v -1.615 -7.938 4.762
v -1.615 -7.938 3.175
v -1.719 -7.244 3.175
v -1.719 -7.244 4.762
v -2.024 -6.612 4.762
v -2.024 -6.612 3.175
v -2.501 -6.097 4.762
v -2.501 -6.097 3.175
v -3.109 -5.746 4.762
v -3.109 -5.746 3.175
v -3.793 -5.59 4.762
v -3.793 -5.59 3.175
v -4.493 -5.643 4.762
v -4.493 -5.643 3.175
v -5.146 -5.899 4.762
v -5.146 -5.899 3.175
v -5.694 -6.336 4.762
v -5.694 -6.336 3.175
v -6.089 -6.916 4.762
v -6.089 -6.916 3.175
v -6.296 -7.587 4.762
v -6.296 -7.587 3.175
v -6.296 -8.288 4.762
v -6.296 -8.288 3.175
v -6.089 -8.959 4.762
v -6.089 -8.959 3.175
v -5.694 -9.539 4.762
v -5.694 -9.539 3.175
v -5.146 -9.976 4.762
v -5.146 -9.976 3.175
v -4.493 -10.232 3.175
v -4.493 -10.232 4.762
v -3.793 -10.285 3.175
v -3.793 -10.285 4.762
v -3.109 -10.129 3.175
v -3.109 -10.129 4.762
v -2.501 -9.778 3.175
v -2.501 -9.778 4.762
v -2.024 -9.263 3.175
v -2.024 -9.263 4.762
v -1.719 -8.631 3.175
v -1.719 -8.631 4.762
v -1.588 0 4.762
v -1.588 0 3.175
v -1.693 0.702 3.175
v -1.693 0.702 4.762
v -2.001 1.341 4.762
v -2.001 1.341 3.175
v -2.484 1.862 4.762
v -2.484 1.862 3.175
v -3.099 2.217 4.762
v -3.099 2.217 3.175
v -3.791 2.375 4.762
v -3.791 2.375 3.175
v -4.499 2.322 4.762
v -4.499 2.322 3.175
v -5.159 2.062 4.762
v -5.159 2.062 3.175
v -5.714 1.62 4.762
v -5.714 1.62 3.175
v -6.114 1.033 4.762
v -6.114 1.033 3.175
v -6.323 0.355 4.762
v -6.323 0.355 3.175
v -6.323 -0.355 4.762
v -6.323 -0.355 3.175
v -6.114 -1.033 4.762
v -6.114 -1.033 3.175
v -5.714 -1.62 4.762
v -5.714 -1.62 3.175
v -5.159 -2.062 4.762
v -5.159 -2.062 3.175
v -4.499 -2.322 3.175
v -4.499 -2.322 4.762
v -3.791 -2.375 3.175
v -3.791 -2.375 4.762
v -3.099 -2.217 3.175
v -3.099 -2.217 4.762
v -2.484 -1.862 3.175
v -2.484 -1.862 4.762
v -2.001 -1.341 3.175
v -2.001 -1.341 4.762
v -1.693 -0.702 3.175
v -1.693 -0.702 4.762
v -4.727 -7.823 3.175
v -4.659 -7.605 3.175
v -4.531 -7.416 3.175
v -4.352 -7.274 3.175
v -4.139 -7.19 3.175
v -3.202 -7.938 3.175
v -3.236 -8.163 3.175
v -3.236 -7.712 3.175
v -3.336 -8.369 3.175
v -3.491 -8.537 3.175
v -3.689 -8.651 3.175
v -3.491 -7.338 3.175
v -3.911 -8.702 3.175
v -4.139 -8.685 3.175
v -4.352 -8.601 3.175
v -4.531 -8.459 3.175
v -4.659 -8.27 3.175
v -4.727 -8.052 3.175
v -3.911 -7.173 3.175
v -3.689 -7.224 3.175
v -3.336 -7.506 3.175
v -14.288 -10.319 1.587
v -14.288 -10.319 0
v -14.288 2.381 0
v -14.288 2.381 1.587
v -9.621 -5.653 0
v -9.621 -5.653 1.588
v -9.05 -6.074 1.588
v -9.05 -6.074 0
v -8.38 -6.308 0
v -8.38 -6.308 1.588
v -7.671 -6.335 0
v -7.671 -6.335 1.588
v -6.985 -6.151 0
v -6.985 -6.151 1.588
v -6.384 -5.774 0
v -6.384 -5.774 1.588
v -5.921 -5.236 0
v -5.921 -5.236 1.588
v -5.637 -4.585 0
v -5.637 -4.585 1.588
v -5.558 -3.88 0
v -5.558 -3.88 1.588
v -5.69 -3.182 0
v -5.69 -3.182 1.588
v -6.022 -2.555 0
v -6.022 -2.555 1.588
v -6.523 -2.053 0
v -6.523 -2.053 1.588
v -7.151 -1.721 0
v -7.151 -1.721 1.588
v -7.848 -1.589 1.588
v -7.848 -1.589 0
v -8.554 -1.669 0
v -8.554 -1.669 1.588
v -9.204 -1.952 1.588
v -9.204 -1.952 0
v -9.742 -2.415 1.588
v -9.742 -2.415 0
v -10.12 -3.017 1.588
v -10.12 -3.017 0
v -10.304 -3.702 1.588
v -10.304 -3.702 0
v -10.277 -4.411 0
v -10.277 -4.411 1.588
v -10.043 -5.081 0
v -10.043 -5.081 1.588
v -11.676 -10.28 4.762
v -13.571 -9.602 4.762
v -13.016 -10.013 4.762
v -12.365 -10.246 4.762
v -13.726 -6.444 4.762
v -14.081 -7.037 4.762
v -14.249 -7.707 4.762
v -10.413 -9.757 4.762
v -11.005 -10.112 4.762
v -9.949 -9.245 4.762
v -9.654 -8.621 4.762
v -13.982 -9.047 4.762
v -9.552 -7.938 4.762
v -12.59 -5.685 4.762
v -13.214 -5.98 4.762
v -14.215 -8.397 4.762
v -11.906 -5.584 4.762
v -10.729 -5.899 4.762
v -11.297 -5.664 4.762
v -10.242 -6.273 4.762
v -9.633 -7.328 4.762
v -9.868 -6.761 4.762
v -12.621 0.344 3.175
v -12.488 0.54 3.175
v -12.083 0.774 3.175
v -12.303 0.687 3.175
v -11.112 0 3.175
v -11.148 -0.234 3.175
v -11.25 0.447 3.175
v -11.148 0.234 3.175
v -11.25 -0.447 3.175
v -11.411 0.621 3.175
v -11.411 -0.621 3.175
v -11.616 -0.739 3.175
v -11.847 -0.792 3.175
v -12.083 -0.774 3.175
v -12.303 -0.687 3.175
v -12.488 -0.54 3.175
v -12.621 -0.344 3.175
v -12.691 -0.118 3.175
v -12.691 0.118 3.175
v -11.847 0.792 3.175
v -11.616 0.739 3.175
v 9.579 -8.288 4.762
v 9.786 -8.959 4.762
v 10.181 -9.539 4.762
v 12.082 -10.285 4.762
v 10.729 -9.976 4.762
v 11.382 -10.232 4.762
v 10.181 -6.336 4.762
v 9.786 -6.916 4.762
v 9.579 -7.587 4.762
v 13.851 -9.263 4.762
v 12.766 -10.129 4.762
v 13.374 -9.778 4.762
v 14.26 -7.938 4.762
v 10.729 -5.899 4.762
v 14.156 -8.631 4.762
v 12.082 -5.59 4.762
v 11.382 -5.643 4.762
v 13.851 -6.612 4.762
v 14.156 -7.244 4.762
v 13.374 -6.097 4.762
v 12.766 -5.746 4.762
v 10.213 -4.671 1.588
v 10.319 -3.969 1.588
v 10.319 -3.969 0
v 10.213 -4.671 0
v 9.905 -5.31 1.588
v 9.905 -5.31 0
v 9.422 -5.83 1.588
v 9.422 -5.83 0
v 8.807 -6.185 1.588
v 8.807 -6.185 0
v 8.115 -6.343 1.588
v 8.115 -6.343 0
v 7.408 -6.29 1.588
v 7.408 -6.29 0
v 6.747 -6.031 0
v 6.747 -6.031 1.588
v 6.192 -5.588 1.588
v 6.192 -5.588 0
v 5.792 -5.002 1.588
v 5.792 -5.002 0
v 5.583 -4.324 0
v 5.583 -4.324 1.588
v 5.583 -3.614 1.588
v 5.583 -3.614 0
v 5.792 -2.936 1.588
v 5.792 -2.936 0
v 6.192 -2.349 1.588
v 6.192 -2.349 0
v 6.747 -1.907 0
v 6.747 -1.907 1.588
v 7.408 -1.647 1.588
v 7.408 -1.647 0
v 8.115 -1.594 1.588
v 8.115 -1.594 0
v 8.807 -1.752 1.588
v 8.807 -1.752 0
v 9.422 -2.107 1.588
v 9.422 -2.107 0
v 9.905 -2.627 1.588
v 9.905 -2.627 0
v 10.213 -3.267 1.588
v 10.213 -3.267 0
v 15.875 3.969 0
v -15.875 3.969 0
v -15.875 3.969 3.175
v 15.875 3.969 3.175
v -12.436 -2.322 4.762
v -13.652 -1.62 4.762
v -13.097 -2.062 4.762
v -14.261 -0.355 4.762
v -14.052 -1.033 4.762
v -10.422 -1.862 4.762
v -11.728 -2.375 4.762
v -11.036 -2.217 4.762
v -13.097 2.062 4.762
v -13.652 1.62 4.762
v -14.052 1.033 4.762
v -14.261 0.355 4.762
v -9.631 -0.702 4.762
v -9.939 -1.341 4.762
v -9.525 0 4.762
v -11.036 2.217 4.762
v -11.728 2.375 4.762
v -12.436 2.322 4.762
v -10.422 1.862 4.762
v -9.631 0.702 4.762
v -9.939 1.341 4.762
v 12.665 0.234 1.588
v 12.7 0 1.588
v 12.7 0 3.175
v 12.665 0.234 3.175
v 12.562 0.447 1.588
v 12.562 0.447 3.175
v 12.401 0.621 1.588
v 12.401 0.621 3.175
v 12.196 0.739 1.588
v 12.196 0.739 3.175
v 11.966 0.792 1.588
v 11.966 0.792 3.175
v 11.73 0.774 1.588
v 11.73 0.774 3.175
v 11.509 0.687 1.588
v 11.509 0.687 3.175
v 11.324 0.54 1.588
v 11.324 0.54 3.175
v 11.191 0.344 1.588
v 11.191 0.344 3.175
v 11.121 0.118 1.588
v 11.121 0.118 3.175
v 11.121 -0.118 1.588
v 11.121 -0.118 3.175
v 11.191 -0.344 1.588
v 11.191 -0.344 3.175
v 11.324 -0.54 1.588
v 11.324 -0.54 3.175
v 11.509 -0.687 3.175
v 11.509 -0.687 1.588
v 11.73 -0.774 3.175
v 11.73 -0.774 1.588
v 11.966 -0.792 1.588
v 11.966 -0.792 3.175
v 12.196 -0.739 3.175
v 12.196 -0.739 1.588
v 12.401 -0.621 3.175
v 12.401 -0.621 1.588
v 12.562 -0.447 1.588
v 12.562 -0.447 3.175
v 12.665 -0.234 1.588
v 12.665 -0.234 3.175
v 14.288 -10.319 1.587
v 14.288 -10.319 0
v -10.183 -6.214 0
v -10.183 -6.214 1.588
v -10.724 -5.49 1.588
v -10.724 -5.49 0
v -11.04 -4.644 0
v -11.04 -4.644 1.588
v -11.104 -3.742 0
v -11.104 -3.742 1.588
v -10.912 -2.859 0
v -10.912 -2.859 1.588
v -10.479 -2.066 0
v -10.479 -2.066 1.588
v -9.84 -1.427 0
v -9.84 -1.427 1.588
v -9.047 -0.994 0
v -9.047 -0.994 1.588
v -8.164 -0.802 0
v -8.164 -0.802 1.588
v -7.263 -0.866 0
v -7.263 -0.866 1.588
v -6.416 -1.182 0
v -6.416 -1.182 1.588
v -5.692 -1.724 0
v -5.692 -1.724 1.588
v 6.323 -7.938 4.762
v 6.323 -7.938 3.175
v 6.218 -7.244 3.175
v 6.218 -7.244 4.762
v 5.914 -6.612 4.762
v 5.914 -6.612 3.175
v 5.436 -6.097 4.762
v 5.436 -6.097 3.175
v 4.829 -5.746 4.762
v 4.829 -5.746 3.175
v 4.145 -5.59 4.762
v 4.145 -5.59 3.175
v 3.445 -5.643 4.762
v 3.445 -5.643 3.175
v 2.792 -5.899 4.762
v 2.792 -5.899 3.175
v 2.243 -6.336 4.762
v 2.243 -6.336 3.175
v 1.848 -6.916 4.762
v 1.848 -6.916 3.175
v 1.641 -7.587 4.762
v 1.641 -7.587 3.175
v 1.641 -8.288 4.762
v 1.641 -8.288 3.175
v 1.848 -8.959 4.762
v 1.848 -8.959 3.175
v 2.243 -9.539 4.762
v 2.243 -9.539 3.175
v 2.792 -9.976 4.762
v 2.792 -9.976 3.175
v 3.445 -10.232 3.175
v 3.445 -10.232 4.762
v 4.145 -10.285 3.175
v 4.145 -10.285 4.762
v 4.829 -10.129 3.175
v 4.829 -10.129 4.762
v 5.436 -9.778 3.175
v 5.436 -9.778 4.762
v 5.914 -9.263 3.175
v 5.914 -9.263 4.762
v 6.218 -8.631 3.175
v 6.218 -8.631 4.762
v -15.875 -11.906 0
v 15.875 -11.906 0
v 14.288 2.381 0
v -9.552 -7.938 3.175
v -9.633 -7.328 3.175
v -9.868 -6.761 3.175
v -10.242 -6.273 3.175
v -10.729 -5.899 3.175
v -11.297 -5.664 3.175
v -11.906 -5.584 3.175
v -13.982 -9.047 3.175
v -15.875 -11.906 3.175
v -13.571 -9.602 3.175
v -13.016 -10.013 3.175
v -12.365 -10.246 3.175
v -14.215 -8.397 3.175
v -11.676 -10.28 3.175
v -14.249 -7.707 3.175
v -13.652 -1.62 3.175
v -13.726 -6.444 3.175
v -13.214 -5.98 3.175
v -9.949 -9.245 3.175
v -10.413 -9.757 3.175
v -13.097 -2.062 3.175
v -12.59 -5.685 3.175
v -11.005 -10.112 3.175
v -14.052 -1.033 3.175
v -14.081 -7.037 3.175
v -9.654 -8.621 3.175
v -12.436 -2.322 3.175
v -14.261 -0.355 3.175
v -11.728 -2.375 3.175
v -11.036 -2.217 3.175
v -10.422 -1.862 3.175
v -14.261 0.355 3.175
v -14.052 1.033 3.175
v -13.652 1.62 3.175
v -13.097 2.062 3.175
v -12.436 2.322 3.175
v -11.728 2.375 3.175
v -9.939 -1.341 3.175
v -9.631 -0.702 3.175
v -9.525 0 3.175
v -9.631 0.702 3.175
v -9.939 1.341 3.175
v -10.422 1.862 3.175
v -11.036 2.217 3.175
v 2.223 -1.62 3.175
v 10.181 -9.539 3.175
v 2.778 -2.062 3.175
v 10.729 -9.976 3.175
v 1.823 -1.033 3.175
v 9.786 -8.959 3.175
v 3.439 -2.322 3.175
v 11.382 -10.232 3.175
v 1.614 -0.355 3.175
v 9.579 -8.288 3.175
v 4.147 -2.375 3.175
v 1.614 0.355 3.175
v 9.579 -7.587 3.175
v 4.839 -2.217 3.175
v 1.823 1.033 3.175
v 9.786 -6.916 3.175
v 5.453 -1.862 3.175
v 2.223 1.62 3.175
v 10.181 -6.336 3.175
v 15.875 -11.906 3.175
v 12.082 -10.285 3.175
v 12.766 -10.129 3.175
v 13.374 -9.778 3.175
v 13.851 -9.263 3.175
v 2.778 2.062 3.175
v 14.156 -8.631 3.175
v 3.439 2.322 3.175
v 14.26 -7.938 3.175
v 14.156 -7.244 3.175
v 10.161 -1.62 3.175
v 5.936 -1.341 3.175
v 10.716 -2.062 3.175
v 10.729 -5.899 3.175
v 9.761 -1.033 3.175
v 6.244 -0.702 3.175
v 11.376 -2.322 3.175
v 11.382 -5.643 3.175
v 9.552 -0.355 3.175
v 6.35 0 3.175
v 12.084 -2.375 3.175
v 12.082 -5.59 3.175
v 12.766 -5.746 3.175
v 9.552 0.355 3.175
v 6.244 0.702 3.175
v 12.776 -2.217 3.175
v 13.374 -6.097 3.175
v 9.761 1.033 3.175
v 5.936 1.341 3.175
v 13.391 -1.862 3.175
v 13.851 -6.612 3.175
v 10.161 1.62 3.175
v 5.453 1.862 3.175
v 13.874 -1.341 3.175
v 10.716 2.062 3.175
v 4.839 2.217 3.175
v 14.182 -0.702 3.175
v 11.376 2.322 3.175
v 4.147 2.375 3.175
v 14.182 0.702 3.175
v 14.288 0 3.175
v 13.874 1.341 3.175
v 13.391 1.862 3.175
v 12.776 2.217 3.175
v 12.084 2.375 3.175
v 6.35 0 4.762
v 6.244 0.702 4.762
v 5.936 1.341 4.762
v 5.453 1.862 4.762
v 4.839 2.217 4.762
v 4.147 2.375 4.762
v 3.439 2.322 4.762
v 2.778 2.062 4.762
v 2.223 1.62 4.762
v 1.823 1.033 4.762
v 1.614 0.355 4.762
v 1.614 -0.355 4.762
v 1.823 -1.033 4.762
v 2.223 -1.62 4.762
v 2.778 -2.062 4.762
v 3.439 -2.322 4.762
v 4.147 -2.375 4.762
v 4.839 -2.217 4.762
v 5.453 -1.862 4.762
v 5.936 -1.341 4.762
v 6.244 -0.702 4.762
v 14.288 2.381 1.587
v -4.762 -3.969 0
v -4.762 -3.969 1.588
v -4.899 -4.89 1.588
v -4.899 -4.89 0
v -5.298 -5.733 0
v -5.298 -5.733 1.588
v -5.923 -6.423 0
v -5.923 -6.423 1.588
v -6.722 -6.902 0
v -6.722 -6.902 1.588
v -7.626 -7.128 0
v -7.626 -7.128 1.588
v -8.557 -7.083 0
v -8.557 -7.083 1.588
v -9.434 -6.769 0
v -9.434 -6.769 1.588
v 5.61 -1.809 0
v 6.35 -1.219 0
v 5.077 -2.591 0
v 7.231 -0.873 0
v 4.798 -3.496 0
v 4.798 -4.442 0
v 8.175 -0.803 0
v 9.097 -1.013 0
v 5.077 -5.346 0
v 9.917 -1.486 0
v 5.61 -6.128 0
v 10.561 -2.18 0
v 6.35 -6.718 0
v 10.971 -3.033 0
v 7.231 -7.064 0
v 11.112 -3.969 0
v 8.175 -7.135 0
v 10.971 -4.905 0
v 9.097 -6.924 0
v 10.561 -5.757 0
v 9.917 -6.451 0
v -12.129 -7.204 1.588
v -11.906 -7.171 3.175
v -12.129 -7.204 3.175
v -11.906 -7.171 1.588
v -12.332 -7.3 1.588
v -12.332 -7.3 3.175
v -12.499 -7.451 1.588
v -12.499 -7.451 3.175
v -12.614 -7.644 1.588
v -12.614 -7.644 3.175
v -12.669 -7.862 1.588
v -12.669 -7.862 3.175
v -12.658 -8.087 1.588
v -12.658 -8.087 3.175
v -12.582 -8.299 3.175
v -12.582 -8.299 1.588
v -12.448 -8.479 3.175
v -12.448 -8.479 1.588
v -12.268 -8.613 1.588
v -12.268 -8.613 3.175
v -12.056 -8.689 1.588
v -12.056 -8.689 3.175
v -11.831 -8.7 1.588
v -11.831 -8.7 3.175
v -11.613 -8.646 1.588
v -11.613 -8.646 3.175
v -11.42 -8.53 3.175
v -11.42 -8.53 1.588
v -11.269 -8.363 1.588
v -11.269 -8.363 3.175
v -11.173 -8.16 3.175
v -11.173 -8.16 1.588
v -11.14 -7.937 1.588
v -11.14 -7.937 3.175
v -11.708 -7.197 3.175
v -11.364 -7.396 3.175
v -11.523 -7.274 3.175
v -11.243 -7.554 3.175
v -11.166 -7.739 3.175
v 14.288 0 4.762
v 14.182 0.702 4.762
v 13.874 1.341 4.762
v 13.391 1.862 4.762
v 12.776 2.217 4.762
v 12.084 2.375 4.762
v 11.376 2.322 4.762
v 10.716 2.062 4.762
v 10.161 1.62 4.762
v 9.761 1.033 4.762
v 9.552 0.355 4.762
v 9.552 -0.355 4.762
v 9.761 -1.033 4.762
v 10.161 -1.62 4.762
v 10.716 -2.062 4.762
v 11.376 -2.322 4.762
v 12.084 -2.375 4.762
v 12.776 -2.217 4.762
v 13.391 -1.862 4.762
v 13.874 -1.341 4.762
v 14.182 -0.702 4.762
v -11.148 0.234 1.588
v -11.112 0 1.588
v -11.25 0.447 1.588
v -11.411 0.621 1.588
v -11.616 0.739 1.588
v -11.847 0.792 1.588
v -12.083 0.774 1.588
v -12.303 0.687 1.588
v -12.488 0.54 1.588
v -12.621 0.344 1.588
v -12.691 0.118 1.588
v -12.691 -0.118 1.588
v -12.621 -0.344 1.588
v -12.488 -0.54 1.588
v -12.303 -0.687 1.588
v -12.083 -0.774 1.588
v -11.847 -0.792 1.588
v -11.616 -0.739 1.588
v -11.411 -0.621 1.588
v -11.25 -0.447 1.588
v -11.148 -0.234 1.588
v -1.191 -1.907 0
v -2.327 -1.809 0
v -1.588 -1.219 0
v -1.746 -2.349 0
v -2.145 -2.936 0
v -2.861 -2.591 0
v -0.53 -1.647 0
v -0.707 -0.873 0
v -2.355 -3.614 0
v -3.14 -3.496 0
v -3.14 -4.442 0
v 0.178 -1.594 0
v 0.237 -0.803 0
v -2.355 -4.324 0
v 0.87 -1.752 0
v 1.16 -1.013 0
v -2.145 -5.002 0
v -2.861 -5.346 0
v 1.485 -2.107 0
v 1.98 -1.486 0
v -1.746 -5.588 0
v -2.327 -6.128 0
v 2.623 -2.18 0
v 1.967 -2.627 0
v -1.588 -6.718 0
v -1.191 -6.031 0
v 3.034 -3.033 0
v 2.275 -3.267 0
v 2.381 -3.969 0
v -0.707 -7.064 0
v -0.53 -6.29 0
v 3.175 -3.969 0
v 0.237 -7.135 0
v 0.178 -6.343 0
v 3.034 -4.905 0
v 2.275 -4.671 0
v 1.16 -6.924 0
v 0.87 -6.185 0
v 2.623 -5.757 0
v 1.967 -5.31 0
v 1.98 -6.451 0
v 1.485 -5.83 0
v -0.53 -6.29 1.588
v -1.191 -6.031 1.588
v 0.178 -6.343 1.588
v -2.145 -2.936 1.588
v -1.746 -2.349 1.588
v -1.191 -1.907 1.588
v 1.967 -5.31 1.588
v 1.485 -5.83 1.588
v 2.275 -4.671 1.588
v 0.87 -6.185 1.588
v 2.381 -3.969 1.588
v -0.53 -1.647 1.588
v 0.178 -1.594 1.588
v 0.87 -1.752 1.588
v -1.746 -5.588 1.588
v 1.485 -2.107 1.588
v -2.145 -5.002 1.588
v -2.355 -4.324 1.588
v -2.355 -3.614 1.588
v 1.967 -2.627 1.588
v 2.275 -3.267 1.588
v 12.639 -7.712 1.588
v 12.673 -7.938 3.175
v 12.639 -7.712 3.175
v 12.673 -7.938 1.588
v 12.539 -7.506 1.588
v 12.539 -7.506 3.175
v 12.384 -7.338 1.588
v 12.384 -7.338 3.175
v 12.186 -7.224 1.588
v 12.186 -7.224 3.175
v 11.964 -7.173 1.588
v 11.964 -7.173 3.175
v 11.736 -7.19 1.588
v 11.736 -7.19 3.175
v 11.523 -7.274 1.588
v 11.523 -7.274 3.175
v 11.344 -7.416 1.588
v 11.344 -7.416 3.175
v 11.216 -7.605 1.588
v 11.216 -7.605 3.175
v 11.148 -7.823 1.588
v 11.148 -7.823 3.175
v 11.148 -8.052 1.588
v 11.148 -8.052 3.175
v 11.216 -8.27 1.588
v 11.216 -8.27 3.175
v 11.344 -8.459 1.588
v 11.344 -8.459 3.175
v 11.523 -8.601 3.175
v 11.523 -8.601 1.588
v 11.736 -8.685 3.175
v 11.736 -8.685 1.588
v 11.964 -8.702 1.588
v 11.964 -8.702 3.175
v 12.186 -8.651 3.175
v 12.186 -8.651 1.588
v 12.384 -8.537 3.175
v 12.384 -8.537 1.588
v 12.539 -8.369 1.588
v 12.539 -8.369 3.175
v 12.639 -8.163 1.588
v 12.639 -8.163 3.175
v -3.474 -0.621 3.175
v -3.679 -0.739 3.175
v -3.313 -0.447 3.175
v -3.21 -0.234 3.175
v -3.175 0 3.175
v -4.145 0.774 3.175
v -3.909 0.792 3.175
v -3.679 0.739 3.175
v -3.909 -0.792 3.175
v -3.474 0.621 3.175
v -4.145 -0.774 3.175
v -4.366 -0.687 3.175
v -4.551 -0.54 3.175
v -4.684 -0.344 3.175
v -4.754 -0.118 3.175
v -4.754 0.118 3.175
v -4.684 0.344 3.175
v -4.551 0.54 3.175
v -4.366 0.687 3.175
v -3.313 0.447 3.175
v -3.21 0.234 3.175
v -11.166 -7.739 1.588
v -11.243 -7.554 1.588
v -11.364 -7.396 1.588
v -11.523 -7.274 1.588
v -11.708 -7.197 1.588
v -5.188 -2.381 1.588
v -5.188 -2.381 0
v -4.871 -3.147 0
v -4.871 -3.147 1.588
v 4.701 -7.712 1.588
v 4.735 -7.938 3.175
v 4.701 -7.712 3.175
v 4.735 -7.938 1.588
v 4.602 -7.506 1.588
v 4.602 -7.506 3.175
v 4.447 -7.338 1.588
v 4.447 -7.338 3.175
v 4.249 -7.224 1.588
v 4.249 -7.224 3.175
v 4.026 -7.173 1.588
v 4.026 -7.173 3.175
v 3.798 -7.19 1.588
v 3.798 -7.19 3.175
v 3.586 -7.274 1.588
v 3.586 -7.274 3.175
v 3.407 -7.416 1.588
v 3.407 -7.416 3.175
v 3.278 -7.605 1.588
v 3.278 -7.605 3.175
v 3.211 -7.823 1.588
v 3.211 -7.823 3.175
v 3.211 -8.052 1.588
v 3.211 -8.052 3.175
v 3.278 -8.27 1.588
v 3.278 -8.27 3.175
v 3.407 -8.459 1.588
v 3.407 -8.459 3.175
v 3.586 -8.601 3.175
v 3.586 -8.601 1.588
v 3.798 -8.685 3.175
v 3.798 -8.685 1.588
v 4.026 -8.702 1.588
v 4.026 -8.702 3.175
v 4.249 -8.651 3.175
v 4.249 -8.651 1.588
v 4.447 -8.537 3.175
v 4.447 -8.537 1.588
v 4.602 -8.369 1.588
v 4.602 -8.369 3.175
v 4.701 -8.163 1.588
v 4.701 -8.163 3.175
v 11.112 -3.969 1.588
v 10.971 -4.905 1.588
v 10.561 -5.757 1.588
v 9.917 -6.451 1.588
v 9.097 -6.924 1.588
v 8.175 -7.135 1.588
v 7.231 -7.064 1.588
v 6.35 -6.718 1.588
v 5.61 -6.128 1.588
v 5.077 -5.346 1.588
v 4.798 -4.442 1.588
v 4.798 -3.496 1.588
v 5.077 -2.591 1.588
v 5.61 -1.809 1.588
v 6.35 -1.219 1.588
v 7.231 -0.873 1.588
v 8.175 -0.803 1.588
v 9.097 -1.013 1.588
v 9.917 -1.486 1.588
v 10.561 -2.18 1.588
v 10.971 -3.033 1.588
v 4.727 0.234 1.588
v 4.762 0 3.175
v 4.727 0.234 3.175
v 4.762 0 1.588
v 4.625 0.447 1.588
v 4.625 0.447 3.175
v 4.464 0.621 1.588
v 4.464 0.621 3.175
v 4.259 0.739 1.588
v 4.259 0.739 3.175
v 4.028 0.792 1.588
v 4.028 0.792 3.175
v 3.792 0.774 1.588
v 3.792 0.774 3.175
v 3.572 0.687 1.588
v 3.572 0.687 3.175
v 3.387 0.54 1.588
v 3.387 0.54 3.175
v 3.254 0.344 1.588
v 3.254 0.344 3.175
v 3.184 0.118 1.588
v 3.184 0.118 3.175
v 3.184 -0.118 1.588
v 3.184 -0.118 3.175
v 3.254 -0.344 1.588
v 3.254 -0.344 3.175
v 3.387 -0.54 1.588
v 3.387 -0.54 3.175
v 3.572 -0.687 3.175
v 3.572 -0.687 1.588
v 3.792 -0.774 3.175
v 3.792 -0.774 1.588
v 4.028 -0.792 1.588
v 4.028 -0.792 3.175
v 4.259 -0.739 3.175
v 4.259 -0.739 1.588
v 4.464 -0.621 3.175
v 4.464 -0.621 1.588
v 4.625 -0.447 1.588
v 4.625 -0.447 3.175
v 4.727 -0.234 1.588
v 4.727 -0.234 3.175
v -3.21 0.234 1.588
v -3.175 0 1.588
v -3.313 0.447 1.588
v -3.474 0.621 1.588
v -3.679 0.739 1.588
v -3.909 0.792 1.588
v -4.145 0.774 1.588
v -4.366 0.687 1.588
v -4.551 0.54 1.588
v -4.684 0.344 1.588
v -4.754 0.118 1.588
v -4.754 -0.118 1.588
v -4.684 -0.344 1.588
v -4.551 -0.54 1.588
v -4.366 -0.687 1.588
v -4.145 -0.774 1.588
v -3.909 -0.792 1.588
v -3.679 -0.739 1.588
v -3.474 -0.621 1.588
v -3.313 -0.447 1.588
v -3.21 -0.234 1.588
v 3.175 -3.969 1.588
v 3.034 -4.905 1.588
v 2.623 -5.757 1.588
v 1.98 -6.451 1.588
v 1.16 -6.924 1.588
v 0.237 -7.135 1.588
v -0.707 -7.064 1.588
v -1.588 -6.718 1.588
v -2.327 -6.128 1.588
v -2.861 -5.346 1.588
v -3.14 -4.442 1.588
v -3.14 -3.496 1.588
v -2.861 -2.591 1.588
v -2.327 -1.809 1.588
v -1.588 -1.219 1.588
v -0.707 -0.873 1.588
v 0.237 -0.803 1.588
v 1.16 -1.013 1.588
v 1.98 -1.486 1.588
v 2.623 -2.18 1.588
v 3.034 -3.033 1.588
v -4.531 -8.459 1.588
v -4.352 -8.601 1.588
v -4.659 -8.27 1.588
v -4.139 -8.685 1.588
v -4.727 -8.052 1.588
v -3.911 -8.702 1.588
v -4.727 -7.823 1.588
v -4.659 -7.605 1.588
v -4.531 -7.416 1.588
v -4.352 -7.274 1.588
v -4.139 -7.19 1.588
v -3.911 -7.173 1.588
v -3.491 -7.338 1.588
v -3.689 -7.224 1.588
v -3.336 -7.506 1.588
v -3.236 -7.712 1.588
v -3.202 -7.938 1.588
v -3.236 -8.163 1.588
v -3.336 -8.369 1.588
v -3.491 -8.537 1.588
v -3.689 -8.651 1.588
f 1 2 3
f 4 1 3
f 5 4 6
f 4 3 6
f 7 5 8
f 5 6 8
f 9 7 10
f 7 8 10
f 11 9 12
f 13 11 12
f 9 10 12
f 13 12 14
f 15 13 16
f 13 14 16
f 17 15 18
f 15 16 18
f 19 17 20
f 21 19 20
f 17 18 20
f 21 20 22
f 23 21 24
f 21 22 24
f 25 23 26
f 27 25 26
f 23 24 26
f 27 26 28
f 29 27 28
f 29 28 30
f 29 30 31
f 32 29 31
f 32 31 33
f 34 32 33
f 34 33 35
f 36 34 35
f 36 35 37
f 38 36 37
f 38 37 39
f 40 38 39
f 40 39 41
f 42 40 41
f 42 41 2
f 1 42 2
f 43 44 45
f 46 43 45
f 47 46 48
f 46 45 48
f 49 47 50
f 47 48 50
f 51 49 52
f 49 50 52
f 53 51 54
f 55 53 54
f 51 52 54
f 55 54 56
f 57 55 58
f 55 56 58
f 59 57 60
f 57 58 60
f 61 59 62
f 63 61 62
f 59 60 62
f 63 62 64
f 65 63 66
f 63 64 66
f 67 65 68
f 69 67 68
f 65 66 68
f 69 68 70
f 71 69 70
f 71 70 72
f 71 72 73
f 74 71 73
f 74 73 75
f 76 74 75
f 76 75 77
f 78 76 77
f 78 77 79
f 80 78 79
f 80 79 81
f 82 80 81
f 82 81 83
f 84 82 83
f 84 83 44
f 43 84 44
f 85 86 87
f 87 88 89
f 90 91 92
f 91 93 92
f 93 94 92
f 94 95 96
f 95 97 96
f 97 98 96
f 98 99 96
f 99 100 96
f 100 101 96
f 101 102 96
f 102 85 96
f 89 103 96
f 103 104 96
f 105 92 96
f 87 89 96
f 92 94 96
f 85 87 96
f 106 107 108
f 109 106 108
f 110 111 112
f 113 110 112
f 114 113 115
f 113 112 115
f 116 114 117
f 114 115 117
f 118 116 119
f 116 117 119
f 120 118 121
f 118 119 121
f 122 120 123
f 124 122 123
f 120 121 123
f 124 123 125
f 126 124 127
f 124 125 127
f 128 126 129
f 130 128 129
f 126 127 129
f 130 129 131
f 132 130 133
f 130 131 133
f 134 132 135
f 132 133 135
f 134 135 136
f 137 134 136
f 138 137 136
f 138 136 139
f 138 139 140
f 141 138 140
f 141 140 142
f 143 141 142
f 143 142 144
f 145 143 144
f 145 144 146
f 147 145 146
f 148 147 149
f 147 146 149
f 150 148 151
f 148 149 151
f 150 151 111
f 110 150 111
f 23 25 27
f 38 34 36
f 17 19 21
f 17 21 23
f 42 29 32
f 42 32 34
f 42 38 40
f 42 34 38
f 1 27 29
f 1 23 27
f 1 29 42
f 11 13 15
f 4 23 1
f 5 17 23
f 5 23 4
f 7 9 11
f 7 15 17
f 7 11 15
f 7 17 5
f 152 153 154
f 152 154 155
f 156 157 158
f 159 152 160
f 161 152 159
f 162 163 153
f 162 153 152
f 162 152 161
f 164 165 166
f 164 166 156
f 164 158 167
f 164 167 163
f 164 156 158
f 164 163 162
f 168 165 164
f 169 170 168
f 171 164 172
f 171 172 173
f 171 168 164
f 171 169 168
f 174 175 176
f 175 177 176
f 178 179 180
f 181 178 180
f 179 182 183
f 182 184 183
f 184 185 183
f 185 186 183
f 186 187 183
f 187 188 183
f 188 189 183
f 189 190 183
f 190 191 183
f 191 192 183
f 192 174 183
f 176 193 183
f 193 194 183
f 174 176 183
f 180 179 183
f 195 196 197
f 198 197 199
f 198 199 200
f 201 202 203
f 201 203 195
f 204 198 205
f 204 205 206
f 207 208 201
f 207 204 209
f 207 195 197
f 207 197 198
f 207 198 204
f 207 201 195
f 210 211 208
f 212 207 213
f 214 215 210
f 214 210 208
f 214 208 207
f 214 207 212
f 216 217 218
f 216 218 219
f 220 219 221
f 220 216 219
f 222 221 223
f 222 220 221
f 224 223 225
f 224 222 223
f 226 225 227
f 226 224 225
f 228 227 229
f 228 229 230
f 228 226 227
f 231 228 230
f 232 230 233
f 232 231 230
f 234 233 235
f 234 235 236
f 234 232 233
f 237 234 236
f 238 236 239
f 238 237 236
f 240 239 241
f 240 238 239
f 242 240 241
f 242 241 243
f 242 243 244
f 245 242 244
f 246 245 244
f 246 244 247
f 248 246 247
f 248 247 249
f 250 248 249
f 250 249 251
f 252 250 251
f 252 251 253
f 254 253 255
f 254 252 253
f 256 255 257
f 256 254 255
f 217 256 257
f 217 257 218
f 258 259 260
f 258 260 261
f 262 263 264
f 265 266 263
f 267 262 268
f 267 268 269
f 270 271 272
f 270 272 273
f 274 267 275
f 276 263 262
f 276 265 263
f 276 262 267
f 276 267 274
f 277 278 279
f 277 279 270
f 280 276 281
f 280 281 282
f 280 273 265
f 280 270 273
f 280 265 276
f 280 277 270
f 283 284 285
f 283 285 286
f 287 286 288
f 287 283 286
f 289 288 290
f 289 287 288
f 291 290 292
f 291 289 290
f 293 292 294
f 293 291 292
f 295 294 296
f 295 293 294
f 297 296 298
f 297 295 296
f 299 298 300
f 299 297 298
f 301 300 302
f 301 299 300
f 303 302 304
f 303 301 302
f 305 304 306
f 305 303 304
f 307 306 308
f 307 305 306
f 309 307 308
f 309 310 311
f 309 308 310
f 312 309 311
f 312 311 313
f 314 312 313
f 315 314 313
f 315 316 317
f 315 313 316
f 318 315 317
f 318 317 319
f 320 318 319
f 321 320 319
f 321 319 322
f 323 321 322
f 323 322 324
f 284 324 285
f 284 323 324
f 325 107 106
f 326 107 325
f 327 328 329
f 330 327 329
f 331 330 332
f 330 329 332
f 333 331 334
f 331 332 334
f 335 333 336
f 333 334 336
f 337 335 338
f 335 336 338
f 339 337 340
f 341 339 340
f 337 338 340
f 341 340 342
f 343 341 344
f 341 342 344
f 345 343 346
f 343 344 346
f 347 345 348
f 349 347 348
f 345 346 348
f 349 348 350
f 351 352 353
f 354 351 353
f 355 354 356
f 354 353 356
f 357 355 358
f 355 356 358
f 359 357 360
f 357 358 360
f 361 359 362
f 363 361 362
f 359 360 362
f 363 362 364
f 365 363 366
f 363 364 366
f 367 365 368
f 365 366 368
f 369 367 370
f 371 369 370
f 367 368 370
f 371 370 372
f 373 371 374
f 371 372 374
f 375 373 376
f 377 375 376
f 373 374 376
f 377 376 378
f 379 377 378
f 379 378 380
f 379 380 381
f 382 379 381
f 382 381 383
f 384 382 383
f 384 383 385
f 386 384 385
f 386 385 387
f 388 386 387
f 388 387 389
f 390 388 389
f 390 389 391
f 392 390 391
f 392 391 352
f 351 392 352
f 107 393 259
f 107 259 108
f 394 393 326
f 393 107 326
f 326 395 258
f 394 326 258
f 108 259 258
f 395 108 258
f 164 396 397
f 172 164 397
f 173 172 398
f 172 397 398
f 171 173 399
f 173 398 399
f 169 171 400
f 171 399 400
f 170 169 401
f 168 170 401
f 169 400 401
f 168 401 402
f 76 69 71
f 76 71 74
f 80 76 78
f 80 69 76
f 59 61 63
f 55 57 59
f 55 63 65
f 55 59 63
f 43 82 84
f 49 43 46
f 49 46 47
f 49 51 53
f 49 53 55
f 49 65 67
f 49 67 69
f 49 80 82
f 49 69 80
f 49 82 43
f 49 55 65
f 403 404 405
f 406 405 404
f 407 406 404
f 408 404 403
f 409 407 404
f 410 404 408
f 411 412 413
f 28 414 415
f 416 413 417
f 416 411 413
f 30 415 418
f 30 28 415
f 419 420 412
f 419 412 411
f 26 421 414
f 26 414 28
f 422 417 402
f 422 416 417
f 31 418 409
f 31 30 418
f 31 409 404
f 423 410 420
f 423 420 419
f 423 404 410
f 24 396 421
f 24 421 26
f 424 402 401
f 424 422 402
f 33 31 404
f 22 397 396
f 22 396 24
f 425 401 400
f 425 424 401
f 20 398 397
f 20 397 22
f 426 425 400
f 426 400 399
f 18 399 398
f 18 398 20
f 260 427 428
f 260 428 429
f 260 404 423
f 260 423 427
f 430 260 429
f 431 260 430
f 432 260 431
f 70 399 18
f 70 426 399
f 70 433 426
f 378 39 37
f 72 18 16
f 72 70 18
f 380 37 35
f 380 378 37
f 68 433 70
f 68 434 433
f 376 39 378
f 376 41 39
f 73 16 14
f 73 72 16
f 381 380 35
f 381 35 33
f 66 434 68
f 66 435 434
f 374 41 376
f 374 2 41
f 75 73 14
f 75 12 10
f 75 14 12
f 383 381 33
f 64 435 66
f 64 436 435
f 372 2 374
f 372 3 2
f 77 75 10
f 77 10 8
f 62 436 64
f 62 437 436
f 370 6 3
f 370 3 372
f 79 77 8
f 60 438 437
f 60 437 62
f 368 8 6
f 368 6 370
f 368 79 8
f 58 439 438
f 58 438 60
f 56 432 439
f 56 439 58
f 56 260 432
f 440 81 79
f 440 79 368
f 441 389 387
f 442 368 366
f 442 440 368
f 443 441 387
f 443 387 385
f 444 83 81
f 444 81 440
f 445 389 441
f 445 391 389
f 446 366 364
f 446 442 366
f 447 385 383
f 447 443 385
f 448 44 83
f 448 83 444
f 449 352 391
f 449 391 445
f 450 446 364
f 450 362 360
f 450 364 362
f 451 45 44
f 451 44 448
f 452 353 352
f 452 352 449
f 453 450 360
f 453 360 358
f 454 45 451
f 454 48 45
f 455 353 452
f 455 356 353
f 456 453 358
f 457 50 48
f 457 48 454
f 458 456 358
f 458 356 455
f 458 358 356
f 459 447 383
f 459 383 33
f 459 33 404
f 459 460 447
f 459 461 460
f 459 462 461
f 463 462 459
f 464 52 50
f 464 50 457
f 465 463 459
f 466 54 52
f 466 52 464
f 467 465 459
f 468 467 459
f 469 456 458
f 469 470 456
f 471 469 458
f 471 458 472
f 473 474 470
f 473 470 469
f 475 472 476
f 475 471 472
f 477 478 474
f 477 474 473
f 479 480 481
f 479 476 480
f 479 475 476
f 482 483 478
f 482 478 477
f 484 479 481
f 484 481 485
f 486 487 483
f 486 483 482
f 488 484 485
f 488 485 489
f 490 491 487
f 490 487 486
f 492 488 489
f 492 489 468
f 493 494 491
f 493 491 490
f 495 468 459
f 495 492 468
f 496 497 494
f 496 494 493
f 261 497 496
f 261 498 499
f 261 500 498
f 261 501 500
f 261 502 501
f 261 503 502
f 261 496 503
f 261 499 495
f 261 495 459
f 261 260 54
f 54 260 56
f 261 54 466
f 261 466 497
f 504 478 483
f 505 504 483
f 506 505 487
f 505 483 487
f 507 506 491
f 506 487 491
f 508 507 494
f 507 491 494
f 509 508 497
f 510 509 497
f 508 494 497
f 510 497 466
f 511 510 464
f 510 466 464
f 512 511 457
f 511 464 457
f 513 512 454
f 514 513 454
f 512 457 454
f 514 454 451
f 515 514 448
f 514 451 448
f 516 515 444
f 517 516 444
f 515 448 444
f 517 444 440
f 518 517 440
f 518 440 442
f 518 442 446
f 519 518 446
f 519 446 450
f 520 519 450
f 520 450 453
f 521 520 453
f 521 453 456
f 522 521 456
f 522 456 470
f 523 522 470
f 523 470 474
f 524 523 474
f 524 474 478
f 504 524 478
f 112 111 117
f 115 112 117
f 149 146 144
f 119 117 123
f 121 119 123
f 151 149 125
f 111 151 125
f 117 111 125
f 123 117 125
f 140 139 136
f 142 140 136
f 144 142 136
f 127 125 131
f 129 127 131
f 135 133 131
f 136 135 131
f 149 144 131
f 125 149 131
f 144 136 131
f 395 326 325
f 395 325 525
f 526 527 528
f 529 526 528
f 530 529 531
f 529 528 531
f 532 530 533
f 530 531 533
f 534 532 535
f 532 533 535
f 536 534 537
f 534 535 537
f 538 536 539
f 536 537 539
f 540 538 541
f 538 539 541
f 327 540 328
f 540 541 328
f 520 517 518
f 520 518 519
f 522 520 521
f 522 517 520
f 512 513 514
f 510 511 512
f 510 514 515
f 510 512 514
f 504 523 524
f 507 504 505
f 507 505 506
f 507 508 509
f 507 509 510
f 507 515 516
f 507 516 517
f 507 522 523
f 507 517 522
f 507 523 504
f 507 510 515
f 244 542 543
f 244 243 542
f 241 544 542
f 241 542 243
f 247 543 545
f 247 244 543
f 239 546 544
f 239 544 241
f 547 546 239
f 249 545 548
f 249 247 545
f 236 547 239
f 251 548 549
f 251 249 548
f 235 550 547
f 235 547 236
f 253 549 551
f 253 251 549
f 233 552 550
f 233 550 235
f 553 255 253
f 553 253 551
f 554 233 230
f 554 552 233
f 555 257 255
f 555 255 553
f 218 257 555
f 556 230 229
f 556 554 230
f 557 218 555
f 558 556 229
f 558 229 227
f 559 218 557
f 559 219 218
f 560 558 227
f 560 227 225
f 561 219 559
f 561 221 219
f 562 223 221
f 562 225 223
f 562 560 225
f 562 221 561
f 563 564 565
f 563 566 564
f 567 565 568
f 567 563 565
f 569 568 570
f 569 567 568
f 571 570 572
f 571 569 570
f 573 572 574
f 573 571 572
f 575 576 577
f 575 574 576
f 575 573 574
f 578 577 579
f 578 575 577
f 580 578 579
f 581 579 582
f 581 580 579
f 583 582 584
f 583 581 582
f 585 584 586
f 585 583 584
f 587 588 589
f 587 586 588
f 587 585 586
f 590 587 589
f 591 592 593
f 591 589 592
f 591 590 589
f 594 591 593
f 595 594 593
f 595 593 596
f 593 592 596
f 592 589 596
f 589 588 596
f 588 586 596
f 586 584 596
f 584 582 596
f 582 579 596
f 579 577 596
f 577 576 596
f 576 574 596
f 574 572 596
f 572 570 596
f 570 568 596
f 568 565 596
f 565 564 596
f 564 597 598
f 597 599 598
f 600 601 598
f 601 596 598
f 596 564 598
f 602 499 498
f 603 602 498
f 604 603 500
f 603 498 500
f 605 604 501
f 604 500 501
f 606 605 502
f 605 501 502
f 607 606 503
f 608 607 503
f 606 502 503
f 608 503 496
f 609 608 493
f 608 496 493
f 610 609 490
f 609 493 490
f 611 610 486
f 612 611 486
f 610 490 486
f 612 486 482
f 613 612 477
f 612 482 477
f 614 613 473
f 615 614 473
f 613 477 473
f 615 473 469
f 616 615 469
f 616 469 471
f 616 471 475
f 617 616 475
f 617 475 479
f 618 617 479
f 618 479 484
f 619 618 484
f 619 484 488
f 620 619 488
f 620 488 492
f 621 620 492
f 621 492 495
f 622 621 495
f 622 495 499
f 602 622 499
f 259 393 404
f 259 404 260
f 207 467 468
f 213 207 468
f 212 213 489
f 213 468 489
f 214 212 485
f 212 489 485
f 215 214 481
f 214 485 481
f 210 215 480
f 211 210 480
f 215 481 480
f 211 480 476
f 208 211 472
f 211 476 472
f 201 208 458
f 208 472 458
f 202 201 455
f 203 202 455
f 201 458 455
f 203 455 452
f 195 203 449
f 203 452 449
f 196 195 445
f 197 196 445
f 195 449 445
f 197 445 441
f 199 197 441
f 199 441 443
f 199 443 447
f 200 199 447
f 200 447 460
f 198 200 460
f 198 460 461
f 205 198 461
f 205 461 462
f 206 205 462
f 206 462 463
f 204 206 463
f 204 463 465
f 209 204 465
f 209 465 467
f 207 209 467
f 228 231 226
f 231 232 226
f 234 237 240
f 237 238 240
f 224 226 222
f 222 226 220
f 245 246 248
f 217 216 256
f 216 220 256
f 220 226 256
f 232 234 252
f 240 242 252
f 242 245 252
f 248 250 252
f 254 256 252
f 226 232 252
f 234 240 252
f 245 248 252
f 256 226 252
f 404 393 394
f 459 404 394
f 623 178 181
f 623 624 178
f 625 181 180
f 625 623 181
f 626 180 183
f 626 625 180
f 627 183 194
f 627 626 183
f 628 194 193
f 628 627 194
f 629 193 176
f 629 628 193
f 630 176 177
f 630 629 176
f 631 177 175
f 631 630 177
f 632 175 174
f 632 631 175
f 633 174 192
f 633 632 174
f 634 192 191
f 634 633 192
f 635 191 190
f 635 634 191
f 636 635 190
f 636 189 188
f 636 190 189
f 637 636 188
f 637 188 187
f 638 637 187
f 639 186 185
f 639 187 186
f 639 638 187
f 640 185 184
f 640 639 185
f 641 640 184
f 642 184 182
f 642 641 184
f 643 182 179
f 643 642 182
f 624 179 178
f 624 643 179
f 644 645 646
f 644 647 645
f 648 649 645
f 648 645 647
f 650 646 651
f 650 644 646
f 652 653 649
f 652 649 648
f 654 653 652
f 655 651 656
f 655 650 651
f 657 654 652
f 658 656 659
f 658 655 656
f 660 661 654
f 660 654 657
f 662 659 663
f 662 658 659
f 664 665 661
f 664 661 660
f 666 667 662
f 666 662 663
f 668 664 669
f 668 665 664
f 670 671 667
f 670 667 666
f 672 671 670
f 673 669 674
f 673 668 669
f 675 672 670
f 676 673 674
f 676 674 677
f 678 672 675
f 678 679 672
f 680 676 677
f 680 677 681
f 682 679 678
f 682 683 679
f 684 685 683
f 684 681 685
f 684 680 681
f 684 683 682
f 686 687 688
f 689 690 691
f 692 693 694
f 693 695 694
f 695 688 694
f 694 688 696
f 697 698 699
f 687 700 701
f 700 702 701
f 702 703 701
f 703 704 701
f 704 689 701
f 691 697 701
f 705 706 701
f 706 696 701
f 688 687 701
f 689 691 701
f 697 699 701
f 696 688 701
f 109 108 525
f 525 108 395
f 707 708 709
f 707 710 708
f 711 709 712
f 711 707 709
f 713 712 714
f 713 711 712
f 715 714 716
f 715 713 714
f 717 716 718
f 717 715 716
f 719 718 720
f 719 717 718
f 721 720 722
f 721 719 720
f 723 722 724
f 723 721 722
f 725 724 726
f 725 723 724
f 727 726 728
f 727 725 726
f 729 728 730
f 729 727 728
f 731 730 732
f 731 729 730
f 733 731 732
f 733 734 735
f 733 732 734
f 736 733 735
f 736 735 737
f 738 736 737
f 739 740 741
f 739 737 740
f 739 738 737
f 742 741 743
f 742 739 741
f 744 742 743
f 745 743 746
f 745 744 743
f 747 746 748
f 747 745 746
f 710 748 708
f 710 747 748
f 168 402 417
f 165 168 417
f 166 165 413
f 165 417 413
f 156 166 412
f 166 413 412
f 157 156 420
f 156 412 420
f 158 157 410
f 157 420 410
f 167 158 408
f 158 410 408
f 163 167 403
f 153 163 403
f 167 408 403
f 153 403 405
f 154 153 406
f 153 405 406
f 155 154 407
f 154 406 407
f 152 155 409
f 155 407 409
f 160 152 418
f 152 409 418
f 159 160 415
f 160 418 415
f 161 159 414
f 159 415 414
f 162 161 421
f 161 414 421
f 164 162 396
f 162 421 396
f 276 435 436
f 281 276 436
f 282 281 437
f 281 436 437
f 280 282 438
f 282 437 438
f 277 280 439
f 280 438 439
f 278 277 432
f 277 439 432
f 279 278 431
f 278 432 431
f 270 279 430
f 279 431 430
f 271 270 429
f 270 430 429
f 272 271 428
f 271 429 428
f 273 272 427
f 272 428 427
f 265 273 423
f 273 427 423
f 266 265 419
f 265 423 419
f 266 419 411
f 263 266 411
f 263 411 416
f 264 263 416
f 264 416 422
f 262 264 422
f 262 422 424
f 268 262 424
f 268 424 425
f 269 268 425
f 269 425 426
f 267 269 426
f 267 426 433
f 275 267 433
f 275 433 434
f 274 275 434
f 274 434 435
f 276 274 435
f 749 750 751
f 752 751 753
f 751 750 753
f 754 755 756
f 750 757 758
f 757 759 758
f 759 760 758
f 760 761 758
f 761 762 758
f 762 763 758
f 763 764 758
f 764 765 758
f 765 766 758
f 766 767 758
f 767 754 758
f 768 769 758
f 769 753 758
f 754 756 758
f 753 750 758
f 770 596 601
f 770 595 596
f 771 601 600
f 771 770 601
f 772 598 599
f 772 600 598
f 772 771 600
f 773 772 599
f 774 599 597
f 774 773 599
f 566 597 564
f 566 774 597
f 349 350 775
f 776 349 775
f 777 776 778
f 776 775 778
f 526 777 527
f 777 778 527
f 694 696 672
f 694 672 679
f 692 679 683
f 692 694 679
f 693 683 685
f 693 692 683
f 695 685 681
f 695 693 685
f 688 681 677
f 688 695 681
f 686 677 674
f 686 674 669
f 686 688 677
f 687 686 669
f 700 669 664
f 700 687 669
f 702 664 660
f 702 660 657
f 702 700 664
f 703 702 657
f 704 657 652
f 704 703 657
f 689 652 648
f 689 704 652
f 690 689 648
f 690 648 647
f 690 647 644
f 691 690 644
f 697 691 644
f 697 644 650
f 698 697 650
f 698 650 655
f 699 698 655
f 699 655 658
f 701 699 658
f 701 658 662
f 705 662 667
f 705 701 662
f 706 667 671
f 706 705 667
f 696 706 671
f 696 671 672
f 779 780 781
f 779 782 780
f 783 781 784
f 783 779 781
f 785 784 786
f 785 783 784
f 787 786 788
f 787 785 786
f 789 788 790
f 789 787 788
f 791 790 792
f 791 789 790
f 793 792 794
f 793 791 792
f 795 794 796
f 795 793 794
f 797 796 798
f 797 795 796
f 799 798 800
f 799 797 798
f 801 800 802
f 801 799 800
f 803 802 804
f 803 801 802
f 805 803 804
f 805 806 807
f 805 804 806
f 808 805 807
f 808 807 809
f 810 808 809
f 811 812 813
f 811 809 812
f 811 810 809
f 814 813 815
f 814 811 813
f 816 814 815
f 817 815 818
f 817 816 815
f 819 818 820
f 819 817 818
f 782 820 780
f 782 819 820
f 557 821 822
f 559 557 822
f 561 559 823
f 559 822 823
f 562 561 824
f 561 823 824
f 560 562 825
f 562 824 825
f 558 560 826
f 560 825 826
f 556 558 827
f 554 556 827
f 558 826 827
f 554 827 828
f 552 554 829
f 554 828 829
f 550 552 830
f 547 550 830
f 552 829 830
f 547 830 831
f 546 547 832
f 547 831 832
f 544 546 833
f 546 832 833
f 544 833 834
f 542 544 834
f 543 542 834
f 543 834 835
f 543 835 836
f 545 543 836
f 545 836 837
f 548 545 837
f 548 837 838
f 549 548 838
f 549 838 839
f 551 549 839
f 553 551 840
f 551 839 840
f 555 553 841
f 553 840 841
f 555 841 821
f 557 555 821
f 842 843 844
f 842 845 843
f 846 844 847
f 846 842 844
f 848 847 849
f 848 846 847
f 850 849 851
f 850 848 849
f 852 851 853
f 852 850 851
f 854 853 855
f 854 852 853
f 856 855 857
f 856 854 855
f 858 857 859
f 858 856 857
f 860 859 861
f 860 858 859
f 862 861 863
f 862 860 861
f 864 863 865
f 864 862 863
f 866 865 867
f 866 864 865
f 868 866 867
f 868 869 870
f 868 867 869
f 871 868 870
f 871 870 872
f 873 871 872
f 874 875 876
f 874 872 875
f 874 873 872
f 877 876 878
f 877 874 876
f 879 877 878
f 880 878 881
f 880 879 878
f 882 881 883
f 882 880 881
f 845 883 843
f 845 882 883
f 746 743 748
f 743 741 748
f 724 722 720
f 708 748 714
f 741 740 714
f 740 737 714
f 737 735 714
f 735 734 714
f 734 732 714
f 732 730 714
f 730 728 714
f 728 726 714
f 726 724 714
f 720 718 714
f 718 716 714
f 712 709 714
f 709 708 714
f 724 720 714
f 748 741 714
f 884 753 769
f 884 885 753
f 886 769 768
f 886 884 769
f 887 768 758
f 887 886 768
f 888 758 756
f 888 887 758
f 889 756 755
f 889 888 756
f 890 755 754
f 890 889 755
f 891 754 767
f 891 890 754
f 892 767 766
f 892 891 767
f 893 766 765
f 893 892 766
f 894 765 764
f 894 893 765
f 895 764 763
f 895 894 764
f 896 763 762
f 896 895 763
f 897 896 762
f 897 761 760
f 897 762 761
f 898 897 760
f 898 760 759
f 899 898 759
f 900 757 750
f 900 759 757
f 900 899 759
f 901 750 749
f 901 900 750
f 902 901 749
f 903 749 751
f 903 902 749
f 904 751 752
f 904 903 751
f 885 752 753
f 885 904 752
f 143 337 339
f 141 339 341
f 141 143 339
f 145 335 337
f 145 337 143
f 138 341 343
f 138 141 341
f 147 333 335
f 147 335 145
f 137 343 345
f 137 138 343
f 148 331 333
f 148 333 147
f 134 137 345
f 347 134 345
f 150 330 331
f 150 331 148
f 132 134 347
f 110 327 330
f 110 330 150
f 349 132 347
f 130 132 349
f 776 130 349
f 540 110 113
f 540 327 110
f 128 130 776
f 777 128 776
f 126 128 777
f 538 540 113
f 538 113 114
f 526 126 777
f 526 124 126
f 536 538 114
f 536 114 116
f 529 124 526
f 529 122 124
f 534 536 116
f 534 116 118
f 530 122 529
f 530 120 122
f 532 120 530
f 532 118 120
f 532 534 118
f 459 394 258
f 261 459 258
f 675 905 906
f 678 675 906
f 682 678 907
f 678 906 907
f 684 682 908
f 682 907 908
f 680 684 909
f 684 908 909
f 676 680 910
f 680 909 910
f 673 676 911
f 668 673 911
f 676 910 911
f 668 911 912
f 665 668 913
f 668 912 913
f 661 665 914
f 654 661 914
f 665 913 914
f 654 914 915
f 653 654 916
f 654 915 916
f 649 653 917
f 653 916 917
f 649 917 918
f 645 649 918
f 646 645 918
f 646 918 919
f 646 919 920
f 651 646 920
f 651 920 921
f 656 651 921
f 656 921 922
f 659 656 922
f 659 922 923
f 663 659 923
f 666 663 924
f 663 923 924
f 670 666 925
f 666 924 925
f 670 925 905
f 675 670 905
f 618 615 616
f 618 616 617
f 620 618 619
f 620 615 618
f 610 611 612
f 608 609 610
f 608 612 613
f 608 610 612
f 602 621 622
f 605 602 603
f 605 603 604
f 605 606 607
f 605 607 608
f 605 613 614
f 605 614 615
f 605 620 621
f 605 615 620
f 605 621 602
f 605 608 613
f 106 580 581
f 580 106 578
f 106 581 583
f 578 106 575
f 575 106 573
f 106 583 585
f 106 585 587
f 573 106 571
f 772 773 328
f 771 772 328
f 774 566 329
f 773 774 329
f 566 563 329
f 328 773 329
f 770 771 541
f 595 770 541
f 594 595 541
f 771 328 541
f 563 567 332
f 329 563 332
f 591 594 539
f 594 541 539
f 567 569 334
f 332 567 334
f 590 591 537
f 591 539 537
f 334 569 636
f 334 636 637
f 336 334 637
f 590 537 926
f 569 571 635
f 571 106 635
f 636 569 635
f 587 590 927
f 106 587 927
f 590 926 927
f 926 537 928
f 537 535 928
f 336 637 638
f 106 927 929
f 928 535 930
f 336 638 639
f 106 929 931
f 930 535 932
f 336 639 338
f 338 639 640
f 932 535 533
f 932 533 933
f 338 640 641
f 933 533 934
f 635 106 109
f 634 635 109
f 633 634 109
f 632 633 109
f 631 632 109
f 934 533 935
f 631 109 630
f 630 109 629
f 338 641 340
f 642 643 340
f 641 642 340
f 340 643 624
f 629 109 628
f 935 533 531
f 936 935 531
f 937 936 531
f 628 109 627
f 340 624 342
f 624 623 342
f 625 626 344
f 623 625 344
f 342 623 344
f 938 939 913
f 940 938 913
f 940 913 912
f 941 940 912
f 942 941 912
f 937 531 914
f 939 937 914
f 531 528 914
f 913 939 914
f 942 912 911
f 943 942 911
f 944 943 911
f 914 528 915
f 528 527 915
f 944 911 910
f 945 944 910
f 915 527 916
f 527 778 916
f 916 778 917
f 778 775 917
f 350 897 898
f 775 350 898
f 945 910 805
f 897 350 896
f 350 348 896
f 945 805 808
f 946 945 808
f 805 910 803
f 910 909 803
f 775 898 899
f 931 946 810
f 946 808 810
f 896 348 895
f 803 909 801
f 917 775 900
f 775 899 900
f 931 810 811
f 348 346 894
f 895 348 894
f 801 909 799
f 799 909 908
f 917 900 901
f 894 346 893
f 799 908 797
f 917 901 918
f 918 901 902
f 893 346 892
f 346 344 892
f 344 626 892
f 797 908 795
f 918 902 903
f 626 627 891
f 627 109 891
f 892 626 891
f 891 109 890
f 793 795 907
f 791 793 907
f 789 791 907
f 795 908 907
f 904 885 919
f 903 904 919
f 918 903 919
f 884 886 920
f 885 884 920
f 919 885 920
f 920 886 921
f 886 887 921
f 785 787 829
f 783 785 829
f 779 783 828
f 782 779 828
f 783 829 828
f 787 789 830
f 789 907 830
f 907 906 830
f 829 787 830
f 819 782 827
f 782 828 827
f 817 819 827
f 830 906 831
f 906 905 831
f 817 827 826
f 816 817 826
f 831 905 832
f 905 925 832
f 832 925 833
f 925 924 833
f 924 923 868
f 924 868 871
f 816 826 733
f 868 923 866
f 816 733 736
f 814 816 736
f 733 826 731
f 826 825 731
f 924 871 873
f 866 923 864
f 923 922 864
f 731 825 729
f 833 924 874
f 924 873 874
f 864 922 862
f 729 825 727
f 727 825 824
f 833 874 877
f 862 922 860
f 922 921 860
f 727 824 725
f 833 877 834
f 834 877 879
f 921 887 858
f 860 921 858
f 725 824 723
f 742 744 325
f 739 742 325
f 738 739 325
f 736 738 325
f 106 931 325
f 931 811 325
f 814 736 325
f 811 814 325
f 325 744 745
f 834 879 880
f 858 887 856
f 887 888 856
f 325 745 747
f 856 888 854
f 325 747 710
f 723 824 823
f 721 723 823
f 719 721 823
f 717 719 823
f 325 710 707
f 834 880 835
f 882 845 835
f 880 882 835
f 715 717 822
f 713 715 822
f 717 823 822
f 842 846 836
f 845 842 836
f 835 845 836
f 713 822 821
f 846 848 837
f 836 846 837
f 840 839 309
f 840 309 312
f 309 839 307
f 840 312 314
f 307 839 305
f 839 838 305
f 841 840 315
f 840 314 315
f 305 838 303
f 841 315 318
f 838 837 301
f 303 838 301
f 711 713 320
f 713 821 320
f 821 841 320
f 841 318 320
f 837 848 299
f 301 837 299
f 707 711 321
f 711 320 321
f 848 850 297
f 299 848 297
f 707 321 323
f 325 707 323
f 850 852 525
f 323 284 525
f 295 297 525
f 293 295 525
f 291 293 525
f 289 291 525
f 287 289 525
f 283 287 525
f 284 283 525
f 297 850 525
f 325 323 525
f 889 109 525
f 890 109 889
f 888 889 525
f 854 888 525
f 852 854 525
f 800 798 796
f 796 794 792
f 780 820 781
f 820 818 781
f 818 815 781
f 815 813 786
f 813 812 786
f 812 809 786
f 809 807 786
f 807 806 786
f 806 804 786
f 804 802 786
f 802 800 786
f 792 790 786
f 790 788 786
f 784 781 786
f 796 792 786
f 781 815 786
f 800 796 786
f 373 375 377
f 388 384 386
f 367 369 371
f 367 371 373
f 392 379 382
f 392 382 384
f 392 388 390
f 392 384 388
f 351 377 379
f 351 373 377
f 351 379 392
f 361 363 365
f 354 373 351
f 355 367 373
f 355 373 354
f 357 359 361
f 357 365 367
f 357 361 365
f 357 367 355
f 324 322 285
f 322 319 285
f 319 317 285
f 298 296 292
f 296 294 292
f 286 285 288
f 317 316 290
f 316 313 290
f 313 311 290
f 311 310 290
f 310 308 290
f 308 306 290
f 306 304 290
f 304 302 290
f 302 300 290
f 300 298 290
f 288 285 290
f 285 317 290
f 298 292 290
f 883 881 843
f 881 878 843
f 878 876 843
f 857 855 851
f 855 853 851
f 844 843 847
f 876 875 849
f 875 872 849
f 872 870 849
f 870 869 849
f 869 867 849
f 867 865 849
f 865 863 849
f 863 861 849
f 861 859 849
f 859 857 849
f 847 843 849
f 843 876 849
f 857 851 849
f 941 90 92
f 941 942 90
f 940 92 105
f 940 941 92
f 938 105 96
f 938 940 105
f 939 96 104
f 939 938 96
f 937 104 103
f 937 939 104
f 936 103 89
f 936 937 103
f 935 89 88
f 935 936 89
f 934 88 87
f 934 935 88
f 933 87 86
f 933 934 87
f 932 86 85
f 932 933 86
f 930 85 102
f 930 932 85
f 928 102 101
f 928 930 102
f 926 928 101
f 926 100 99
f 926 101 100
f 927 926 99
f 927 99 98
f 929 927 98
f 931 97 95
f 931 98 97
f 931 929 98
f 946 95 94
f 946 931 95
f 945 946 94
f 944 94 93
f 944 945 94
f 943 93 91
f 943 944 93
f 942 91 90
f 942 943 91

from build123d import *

# Parameters (mm, degrees)
F0_W     = 31.75
F0_H     = 15.875
F0_R     = 2.3538427831
F0_R_2   = 2.38125
F1_DEPTH = 3.175
F2_DEPTH = 4.7625
F3_T     = -1.5875
F4_R     = 3.175
F4_R_2   = 2.38125
F5_DEPTH = 1.5875


with BuildPart() as f1:
    # F0 (on Top) → F1 (new body)
    with BuildSketch(Plane.XY):
        with Locations((0, -3.96875)):
            Rectangle(F0_W, F0_H)
        with BuildLine():
            ThreePointArc((-9.5524072169, -7.9375), (-13.5706681938, -9.6019181938), (-11.90625, -5.5836572169))
            ThreePointArc((-11.90625, -5.5836572169), (-10.2418318062, -6.2730818062), (-9.5524072169, -7.9375))
        make_face(mode=Mode.SUBTRACT)
        with Locations((-3.96875, -7.9375)):
            Circle(F0_R, mode=Mode.SUBTRACT)
        with Locations((3.96875, -7.9375)):
            Circle(F0_R, mode=Mode.SUBTRACT)
        with Locations((11.90625, -7.9375)):
            Circle(F0_R, mode=Mode.SUBTRACT)
        with BuildLine():
            ThreePointArc((-11.90625, -2.38125), (-13.5900480227, 1.6837980227), (-9.525, 0))
            ThreePointArc((-9.525, 0), (-10.2224519773, -1.6837980227), (-11.90625, -2.38125))
        make_face(mode=Mode.SUBTRACT)
        with Locations((-3.96875, 0)):
            Circle(F0_R_2, mode=Mode.SUBTRACT)
        with Locations((3.96875, 0)):
            Circle(F0_R_2, mode=Mode.SUBTRACT)
        with Locations((11.90625, 0)):
            Circle(F0_R_2, mode=Mode.SUBTRACT)
    extrude(amount=F1_DEPTH)

    # F0 (on Top) → F2 (join)
    with BuildSketch(Plane.XY):
        with Locations((11.90625, 0)):
            Circle(F0_R_2)
        with BuildLine():
            ThreePointArc((-11.90625, -2.38125), (-10.2224519773, -1.6837980227), (-9.525, 0))
            ThreePointArc((-9.525, 0), (-13.5900480227, 1.6837980227), (-11.90625, -2.38125))
        make_face()
        with Locations((3.96875, 0)):
            Circle(F0_R_2)
        with Locations((-3.96875, 0)):
            Circle(F0_R_2)
        with BuildLine():
            ThreePointArc((-9.5524072169, -7.9375), (-10.2418318062, -6.2730818062), (-11.90625, -5.5836572169))
            ThreePointArc((-11.90625, -5.5836572169), (-13.5706681938, -9.6019181938), (-9.5524072169, -7.9375))
        make_face()
        with Locations((-3.96875, -7.9375)):
            Circle(F0_R)
        with Locations((3.96875, -7.9375)):
            Circle(F0_R)
        with Locations((11.90625, -7.9375)):
            Circle(F0_R)
    extrude(amount=F2_DEPTH)

    # F3
    f3_openings = [f1.faces().sort_by_distance(p)[0] for p in [
        (0, -3.96875, 0),
    ]]
    offset(amount=F3_T, openings=f3_openings, kind=Kind.INTERSECTION)

    # F4 (on face) → F5 (join)
    with BuildSketch(Plane(origin=(0, 0, 1.5875), x_dir=(1, 0, 0), z_dir=(0, 0, -1))):
        with BuildLine():
            Line((-9.6212980227, 5.6525480227), (-10.1825640303, 6.2138140303))
            ThreePointArc((-10.1825640303, 6.2138140303), (-10.1825640303, 1.7236859697), (-5.6924359697, 1.7236859697))
            Line((-5.6924359697, 1.7236859697), (-6.2537019773, 2.2849519773))
            ThreePointArc((-6.2537019773, 2.2849519773), (-9.6212980227, 2.2849519773), (-9.6212980227, 5.6525480227))
        make_face()
        with BuildLine():
            ThreePointArc((-4.7625, 3.96875), (-6.7224801022, 6.9020675157), (-10.1825640303, 6.2138140303))
            Line((-10.1825640303, 6.2138140303), (-9.6212980227, 5.6525480227))
            ThreePointArc((-9.6212980227, 5.6525480227), (-7.0262350767, 6.1687381368), (-5.55625, 3.96875))
            ThreePointArc((-5.55625, 3.96875), (-5.7375118632, 3.0574850767), (-6.2537019773, 2.2849519773))
            Line((-6.2537019773, 2.2849519773), (-5.6924359697, 1.7236859697))
            ThreePointArc((-5.6924359697, 1.7236859697), (-5.0041824843, 2.7537301022), (-4.7625, 3.96875))
        make_face()
        with Locations((0, 3.96875)):
            Circle(F4_R)
        with Locations((0, 3.96875)):
            Circle(F4_R_2, mode=Mode.SUBTRACT)
        with Locations((7.9375, 3.96875)):
            Circle(F4_R)
        with Locations((7.9375, 3.96875)):
            Circle(F4_R_2, mode=Mode.SUBTRACT)
    extrude(amount=F5_DEPTH)


solid = f1.part
